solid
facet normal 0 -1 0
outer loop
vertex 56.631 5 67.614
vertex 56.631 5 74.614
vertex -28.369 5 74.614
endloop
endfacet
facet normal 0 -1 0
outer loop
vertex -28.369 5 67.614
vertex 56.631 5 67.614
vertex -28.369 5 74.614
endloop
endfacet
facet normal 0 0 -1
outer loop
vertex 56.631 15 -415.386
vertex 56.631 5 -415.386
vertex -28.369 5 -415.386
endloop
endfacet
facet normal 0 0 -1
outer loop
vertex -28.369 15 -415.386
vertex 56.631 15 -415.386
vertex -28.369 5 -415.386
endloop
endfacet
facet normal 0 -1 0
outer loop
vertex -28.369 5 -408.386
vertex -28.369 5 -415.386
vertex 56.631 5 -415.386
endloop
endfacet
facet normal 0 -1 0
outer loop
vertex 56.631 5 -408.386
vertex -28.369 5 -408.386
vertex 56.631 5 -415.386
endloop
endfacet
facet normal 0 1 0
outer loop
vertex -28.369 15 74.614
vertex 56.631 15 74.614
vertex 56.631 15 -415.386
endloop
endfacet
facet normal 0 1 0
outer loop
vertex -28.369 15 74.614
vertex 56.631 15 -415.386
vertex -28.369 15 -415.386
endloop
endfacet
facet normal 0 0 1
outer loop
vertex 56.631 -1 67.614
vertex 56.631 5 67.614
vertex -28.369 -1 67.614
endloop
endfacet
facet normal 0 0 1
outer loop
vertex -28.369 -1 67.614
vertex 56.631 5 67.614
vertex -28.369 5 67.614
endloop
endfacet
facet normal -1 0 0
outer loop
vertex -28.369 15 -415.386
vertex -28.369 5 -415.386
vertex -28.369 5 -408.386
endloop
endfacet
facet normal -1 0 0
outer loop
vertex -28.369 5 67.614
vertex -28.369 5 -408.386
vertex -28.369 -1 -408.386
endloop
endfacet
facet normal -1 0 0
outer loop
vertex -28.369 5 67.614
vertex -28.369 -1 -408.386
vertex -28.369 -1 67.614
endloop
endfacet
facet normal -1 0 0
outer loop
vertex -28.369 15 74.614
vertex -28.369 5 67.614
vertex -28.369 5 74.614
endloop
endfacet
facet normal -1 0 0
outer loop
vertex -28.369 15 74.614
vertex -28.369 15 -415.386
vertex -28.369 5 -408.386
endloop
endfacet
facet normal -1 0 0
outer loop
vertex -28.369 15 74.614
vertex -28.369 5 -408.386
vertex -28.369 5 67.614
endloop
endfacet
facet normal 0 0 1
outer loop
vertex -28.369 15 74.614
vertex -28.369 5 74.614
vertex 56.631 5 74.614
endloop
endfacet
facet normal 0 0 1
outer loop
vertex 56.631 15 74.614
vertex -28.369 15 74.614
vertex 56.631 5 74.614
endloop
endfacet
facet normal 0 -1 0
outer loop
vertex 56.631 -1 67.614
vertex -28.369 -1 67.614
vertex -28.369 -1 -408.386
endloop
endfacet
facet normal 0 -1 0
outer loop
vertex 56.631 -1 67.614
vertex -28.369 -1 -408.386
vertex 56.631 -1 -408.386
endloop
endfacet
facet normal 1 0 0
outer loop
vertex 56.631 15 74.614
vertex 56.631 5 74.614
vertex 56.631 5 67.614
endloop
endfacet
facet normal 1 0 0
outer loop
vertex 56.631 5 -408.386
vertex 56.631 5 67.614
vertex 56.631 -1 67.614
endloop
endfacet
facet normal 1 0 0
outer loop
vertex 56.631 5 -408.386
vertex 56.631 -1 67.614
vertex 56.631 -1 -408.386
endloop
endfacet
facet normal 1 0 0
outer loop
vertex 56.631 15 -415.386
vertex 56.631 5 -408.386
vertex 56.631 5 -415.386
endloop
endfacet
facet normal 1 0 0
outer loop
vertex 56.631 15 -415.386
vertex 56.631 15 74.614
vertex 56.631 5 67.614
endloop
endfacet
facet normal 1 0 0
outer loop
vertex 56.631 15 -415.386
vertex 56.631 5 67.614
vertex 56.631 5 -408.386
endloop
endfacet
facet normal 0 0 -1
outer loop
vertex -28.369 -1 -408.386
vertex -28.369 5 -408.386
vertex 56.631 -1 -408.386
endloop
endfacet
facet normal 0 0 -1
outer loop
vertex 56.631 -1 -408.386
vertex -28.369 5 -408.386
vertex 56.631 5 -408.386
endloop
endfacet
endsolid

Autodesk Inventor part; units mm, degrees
ref_plane "YZ Plane" through (0, 0, 0) normal (1, 0, 0) x (0, 1, 0)
ref_plane "XZ Plane" through (0, 0, 0) normal (0, 1, 0) x (-1, 0, 0)
ref_plane "XY Plane" through (0, 0, 0) normal (0, 0, 1) x (1, 0, 0)
sketch "Sketch1" plane through (0, 0, 0) normal (0, 1, 0) x (-1, 0, 0)
  line L0 (28.3692, 74.6141) -> (-56.6308, 74.6141)
  line L1 (-56.6308, 74.6141) -> (-56.6308, -415.3859)
  line L2 (-56.6308, -415.3859) -> (28.3692, -415.3859)
  line L3 (28.3692, -415.3859) -> (28.3692, 74.6141)
  point P0 (0, 0)
  dimension "d0" = 85
  dimension "d1" = 490
extrude "Extrusion1" add sketch "Sketch1" along normal blind 15
sketch "Sketch2" plane through (-28.3692, 0, 74.6141) normal (0, 0, 1) x (1, 0, 0)
  line L0 (85, 0) -> (0, 0) projected
  line L1 (0, 0) -> (85, 0)
  line L2 (85, 0) -> (85, 5)
  line L3 (85, 5) -> (0, 5)
  line L4 (0, 5) -> (0, 0)
  point P0 (28.3692, 0)
  dimension "d4" = 85
  dimension "d5" = 5
extrude "Extrusion2" cut sketch "Sketch2" against normal blind 7
sketch "Sketch3" plane through (56.6308, 0, -415.3859) normal (0, 0, -1) x (-1, 0, 0)
  line L0 (85, 0) -> (85, 15) projected
  line L1 (85, 5) -> (0, 5) projected
  line L2 (85, 0) -> (0, 0)
  line L3 (0, 0) -> (0, 5)
  line L4 (0, 5) -> (85, 5)
  line L5 (85, 5) -> (85, 0)
  point P0 (56.6308, 0)
  dimension "d8" = 85
  dimension "d9" = 5
extrude "Extrusion3" cut sketch "Sketch3" against normal blind 7
sketch "Sketch4" plane through (0, 0, 0) normal (0, -1, 0) x (1, 0, 0)
  line L0 (-28.3692, -408.3859) -> (56.6308, -408.3859) projected
  line L1 (56.6308, 67.6141) -> (56.6308, -408.3859) projected
  line L2 (56.6308, 67.6141) -> (-28.3692, 67.6141) projected
  line L3 (-28.3692, -408.3859) -> (-28.3692, 67.6141) projected
  line L4 (-28.3692, 67.6141) -> (56.6308, 67.6141) projected
  line L5 (-28.3692, -408.3859) -> (-28.3692, 67.6141) projected
  line L6 (56.6308, 67.6141) -> (-28.3692, 67.6141)
  line L7 (-28.3692, 67.6141) -> (-28.3692, -408.3859)
  line L8 (-28.3692, -408.3859) -> (56.6308, -408.3859)
  line L9 (56.6308, -408.3859) -> (56.6308, 67.6141)
  point P0 (0, 0)
extrude "Extrusion4" add sketch "Sketch4" along normal blind 1
properties part number "Arcade_top"
